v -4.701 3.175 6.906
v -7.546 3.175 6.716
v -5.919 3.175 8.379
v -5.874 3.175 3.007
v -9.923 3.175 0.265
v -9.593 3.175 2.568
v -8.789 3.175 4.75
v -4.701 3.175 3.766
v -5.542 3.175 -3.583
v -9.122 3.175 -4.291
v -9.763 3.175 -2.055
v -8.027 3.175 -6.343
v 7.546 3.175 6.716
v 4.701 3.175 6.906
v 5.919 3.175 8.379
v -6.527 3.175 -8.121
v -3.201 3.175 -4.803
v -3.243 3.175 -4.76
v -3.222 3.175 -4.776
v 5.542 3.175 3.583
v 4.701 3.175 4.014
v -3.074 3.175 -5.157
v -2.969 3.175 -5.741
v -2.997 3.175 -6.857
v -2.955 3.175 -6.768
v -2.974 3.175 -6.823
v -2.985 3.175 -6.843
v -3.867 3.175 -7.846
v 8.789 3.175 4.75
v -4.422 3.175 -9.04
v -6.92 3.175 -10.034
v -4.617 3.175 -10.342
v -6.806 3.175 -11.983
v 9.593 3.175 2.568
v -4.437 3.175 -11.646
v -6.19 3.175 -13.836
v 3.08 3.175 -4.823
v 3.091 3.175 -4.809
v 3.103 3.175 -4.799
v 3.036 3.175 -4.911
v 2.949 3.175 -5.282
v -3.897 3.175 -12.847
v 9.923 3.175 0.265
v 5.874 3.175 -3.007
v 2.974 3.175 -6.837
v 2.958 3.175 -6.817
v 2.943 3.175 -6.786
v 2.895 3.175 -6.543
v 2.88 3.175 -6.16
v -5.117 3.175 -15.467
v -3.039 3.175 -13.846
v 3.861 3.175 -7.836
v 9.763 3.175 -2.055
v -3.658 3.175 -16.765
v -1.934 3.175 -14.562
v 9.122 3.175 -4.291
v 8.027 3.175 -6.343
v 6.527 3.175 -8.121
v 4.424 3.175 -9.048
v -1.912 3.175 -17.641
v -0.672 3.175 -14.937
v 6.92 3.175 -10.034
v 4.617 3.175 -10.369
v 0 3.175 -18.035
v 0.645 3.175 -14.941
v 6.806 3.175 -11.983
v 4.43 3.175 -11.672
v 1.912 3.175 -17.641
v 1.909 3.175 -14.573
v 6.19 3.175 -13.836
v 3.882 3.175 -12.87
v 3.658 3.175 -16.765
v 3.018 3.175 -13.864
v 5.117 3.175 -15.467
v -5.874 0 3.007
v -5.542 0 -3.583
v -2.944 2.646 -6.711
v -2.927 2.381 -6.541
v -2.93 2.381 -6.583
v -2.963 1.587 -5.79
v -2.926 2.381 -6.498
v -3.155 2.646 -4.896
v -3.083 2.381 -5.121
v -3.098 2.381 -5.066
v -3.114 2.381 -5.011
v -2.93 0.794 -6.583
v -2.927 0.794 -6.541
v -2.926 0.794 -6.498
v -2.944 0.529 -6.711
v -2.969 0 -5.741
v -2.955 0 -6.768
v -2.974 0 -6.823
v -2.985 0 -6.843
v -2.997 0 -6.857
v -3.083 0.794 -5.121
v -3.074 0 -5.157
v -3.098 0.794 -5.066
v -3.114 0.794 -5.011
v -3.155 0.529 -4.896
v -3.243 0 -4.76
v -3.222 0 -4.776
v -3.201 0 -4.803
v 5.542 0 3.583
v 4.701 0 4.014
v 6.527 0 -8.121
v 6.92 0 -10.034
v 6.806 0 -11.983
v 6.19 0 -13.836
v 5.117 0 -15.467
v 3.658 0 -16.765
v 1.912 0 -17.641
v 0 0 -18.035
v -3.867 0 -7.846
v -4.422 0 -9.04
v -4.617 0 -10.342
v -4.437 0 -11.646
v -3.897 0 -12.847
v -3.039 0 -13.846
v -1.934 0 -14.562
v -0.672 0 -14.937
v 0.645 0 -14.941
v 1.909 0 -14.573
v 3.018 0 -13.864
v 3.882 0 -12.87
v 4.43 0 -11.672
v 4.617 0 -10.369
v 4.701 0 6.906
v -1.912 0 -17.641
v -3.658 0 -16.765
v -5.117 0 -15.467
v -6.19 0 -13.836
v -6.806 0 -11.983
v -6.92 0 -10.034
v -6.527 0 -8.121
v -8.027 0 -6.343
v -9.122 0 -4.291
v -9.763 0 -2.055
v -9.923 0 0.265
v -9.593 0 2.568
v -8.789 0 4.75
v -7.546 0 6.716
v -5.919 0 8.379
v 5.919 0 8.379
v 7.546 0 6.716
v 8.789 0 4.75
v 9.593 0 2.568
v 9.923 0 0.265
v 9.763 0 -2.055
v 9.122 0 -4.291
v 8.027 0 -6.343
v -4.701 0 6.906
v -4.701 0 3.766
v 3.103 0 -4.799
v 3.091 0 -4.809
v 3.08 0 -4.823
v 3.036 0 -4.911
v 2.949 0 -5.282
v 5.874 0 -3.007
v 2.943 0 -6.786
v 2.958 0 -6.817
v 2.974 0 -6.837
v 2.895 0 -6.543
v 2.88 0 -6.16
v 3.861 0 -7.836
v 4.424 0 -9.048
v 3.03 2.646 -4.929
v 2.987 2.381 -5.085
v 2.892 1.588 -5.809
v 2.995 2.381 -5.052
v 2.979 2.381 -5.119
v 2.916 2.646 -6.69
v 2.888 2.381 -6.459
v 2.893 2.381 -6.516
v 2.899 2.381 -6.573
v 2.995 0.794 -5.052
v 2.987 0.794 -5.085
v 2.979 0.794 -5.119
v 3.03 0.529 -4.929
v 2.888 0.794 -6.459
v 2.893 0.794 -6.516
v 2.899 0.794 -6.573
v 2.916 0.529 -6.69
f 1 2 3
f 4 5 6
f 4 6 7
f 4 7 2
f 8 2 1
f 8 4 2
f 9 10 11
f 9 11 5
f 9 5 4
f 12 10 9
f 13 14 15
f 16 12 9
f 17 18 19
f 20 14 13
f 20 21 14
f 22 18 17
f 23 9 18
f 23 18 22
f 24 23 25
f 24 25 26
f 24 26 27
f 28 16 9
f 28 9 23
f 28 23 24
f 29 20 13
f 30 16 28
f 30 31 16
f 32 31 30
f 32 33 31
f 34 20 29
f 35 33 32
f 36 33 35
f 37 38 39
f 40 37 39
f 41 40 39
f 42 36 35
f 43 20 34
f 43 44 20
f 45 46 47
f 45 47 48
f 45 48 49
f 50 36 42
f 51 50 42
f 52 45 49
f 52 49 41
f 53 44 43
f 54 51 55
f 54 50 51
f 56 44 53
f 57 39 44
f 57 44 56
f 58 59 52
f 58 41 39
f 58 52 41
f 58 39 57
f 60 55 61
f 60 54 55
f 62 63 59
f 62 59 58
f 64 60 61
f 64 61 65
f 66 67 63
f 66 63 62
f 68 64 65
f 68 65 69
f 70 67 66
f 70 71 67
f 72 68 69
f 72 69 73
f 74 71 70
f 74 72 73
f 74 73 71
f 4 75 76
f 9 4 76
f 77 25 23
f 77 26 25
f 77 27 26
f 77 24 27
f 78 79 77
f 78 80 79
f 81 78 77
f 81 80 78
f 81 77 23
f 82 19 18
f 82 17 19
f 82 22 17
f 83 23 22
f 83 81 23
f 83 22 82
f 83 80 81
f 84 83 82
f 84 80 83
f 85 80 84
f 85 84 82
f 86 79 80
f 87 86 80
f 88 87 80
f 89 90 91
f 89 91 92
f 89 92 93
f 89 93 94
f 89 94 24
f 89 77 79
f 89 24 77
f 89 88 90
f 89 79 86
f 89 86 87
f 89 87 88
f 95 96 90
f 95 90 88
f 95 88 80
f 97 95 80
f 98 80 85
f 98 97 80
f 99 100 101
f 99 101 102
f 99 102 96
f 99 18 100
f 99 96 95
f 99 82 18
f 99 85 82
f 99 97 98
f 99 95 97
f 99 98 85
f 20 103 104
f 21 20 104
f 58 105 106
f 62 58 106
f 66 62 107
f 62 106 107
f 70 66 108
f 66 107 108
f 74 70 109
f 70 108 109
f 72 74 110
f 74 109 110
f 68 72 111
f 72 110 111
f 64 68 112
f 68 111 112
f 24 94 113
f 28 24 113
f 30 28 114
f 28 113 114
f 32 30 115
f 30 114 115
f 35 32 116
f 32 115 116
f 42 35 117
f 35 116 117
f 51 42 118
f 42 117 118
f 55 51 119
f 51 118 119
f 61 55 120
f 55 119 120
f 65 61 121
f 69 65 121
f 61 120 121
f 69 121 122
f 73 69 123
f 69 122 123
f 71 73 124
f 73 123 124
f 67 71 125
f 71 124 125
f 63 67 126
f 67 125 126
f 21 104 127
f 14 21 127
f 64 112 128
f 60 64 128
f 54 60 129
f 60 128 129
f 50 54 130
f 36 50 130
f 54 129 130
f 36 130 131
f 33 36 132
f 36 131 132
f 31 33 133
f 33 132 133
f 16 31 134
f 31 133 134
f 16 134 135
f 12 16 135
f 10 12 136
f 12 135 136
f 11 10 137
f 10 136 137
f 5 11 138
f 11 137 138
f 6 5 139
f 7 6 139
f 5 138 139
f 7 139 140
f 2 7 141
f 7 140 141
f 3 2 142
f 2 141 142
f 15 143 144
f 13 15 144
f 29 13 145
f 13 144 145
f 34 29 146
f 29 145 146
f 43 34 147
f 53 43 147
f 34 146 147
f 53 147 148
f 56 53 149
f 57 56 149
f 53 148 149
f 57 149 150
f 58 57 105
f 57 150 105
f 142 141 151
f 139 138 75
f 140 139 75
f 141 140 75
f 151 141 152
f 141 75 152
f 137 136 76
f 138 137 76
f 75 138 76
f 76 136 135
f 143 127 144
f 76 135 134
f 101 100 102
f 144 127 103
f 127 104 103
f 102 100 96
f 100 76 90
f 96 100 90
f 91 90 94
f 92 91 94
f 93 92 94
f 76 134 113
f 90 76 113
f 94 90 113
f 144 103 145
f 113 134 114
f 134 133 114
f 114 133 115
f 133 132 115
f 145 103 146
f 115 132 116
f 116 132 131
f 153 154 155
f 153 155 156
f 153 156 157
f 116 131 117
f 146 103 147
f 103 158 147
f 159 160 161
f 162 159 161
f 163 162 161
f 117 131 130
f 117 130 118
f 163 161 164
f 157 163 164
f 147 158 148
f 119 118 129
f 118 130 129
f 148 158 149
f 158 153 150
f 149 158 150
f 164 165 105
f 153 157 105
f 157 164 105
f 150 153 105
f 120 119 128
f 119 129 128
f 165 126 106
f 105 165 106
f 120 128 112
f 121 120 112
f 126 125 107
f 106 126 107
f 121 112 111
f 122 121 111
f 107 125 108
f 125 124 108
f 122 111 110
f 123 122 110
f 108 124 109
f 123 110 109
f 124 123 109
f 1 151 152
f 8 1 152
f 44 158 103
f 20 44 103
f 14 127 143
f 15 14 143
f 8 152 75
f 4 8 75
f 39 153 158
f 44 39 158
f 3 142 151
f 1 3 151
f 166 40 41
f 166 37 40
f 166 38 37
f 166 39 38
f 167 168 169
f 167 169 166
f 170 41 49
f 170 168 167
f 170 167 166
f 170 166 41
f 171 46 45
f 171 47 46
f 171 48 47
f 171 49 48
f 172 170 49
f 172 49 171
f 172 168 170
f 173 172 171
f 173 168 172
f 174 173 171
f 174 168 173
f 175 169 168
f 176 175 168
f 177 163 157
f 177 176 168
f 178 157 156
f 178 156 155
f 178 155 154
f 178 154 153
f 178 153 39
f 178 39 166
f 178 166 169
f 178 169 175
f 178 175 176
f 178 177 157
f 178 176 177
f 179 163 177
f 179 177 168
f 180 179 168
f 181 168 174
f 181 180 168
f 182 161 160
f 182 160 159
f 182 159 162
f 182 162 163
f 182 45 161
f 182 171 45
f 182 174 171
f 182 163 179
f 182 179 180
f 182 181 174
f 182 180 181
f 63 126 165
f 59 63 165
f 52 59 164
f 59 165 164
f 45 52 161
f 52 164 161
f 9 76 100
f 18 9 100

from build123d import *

# Parameters (mm, degrees)
BOSS_EXTRUDE1_DEPTH = 3.175


with BuildPart() as part:
    # Sketch3 → Boss-Extrude1 (new body)
    with BuildSketch(Plane(origin=(0, 0, 0), x_dir=(1, 0, 0), z_dir=(0, 1, 0))):
        with BuildLine():
            Line((-5.541525375, 3.58326618), (-2.47962532, 5.150959008))
            Line((-2.47962532, 5.150959008), (-2.47962532, 6.474170352))
            ThreePointArc((-2.47962532, 6.474170352), (-2.221563685, 14.417025562), (4.617359972, 10.369227654))
            ThreePointArc((4.617359972, 10.369227654), (4.047797908, 8.147663968), (2.47962532, 6.474170352))
            Line((2.47962532, 6.474170352), (2.47962532, 5.20231788))
            Line((2.47962532, 5.20231788), (5.873962228, 3.007468661))
            Line((5.873962228, 3.007468661), (5.541525375, -3.58326618))
            Line((5.541525375, -3.58326618), (4.701204968, -4.013510228))
            Line((4.701204968, -4.013510228), (4.701204968, -6.905610932))
            Line((4.701204968, -6.905610932), (5.918780254, -8.378526195))
            ThreePointArc((5.918780254, -8.378526195), (9.922634137, -0.265088751), (6.526624698, 8.120961152))
            ThreePointArc((6.526624698, 8.120961152), (5.706991897, 14.686716316), (0, 18.035026682))
            ThreePointArc((0, 18.035026682), (-5.706991897, 14.686716316), (-6.526624698, 8.120961152))
            ThreePointArc((-6.526624698, 8.120961152), (-9.922634137, -0.265088751), (-5.918780254, -8.378526195))
            Line((-5.918780254, -8.378526195), (-4.701204968, -6.905610932))
            Line((-4.701204968, -6.905610932), (-4.701204968, -3.765798027))
            Line((-4.701204968, -3.765798027), (-5.873962228, -3.007468661))
            Line((-5.873962228, -3.007468661), (-5.541525375, 3.58326618))
        make_face()
        with BuildLine():
            Line((-2.47962532, 6.474170352), (-2.47962532, 5.150959008))
            Line((-2.47962532, 5.150959008), (-1.063503338, 5.876013463))
            ThreePointArc((-1.063503338, 5.876013463), (-1.79663243, 6.115743784), (-2.47962532, 6.474170352))
        make_face()
        with BuildLine():
            ThreePointArc((2.47962532, 6.474170352), (1.921985685, 6.17089654), (1.328021538, 5.946968965))
            Line((1.328021538, 5.946968965), (2.47962532, 5.20231788))
            Line((2.47962532, 5.20231788), (2.47962532, 6.474170352))
        make_face()
    extrude(amount=BOSS_EXTRUDE1_DEPTH)

    # Fillet6
    # a fillet whose section is not a circle: 1.27 mm, written as the material it takes off along each edge
    with BuildSketch(Plane(origin=(1.328021538, -5.283304691, -5.946968965), x_dir=(0.8397378391322112, 0, 0.5429920455490709), z_dir=(0, 1, 0))) as fillet6_piece_1:
        with BuildLine():
            Bezier((2.113321876, 0), (0.3966534, 0), (0.898889741, 1.641556979), weights=[1, 0.118948346, 1])
            ThreePointArc((0.898889741, 1.641556979), (0.533488386, 0.774757636), (0, 0))
            Line((0, 0), (2.113321876, 0))
        make_face()
    extrude(amount=13.741609382, mode=Mode.SUBTRACT)
    with BuildSketch(Plane(origin=(-1.063503338, -6.120582224, -5.876013463), x_dir=(-0.891835980226881, 0, -0.4523589110128793), z_dir=(0, 1, 0))) as fillet6_piece_2:
        with BuildLine():
            Bezier((2.168149873, 0), (0.323600022, 0.445521101), (1.438773255, 1.980852292), weights=[1, 0.11123936, 1])
            Line((1.438773255, 1.980852292), (0, 0))
            ThreePointArc((0, 0), (1.084074937, 0.129064678), (2.168149873, 0))
        make_face()
    extrude(amount=15.416164449, mode=Mode.SUBTRACT)


solid = part.part
